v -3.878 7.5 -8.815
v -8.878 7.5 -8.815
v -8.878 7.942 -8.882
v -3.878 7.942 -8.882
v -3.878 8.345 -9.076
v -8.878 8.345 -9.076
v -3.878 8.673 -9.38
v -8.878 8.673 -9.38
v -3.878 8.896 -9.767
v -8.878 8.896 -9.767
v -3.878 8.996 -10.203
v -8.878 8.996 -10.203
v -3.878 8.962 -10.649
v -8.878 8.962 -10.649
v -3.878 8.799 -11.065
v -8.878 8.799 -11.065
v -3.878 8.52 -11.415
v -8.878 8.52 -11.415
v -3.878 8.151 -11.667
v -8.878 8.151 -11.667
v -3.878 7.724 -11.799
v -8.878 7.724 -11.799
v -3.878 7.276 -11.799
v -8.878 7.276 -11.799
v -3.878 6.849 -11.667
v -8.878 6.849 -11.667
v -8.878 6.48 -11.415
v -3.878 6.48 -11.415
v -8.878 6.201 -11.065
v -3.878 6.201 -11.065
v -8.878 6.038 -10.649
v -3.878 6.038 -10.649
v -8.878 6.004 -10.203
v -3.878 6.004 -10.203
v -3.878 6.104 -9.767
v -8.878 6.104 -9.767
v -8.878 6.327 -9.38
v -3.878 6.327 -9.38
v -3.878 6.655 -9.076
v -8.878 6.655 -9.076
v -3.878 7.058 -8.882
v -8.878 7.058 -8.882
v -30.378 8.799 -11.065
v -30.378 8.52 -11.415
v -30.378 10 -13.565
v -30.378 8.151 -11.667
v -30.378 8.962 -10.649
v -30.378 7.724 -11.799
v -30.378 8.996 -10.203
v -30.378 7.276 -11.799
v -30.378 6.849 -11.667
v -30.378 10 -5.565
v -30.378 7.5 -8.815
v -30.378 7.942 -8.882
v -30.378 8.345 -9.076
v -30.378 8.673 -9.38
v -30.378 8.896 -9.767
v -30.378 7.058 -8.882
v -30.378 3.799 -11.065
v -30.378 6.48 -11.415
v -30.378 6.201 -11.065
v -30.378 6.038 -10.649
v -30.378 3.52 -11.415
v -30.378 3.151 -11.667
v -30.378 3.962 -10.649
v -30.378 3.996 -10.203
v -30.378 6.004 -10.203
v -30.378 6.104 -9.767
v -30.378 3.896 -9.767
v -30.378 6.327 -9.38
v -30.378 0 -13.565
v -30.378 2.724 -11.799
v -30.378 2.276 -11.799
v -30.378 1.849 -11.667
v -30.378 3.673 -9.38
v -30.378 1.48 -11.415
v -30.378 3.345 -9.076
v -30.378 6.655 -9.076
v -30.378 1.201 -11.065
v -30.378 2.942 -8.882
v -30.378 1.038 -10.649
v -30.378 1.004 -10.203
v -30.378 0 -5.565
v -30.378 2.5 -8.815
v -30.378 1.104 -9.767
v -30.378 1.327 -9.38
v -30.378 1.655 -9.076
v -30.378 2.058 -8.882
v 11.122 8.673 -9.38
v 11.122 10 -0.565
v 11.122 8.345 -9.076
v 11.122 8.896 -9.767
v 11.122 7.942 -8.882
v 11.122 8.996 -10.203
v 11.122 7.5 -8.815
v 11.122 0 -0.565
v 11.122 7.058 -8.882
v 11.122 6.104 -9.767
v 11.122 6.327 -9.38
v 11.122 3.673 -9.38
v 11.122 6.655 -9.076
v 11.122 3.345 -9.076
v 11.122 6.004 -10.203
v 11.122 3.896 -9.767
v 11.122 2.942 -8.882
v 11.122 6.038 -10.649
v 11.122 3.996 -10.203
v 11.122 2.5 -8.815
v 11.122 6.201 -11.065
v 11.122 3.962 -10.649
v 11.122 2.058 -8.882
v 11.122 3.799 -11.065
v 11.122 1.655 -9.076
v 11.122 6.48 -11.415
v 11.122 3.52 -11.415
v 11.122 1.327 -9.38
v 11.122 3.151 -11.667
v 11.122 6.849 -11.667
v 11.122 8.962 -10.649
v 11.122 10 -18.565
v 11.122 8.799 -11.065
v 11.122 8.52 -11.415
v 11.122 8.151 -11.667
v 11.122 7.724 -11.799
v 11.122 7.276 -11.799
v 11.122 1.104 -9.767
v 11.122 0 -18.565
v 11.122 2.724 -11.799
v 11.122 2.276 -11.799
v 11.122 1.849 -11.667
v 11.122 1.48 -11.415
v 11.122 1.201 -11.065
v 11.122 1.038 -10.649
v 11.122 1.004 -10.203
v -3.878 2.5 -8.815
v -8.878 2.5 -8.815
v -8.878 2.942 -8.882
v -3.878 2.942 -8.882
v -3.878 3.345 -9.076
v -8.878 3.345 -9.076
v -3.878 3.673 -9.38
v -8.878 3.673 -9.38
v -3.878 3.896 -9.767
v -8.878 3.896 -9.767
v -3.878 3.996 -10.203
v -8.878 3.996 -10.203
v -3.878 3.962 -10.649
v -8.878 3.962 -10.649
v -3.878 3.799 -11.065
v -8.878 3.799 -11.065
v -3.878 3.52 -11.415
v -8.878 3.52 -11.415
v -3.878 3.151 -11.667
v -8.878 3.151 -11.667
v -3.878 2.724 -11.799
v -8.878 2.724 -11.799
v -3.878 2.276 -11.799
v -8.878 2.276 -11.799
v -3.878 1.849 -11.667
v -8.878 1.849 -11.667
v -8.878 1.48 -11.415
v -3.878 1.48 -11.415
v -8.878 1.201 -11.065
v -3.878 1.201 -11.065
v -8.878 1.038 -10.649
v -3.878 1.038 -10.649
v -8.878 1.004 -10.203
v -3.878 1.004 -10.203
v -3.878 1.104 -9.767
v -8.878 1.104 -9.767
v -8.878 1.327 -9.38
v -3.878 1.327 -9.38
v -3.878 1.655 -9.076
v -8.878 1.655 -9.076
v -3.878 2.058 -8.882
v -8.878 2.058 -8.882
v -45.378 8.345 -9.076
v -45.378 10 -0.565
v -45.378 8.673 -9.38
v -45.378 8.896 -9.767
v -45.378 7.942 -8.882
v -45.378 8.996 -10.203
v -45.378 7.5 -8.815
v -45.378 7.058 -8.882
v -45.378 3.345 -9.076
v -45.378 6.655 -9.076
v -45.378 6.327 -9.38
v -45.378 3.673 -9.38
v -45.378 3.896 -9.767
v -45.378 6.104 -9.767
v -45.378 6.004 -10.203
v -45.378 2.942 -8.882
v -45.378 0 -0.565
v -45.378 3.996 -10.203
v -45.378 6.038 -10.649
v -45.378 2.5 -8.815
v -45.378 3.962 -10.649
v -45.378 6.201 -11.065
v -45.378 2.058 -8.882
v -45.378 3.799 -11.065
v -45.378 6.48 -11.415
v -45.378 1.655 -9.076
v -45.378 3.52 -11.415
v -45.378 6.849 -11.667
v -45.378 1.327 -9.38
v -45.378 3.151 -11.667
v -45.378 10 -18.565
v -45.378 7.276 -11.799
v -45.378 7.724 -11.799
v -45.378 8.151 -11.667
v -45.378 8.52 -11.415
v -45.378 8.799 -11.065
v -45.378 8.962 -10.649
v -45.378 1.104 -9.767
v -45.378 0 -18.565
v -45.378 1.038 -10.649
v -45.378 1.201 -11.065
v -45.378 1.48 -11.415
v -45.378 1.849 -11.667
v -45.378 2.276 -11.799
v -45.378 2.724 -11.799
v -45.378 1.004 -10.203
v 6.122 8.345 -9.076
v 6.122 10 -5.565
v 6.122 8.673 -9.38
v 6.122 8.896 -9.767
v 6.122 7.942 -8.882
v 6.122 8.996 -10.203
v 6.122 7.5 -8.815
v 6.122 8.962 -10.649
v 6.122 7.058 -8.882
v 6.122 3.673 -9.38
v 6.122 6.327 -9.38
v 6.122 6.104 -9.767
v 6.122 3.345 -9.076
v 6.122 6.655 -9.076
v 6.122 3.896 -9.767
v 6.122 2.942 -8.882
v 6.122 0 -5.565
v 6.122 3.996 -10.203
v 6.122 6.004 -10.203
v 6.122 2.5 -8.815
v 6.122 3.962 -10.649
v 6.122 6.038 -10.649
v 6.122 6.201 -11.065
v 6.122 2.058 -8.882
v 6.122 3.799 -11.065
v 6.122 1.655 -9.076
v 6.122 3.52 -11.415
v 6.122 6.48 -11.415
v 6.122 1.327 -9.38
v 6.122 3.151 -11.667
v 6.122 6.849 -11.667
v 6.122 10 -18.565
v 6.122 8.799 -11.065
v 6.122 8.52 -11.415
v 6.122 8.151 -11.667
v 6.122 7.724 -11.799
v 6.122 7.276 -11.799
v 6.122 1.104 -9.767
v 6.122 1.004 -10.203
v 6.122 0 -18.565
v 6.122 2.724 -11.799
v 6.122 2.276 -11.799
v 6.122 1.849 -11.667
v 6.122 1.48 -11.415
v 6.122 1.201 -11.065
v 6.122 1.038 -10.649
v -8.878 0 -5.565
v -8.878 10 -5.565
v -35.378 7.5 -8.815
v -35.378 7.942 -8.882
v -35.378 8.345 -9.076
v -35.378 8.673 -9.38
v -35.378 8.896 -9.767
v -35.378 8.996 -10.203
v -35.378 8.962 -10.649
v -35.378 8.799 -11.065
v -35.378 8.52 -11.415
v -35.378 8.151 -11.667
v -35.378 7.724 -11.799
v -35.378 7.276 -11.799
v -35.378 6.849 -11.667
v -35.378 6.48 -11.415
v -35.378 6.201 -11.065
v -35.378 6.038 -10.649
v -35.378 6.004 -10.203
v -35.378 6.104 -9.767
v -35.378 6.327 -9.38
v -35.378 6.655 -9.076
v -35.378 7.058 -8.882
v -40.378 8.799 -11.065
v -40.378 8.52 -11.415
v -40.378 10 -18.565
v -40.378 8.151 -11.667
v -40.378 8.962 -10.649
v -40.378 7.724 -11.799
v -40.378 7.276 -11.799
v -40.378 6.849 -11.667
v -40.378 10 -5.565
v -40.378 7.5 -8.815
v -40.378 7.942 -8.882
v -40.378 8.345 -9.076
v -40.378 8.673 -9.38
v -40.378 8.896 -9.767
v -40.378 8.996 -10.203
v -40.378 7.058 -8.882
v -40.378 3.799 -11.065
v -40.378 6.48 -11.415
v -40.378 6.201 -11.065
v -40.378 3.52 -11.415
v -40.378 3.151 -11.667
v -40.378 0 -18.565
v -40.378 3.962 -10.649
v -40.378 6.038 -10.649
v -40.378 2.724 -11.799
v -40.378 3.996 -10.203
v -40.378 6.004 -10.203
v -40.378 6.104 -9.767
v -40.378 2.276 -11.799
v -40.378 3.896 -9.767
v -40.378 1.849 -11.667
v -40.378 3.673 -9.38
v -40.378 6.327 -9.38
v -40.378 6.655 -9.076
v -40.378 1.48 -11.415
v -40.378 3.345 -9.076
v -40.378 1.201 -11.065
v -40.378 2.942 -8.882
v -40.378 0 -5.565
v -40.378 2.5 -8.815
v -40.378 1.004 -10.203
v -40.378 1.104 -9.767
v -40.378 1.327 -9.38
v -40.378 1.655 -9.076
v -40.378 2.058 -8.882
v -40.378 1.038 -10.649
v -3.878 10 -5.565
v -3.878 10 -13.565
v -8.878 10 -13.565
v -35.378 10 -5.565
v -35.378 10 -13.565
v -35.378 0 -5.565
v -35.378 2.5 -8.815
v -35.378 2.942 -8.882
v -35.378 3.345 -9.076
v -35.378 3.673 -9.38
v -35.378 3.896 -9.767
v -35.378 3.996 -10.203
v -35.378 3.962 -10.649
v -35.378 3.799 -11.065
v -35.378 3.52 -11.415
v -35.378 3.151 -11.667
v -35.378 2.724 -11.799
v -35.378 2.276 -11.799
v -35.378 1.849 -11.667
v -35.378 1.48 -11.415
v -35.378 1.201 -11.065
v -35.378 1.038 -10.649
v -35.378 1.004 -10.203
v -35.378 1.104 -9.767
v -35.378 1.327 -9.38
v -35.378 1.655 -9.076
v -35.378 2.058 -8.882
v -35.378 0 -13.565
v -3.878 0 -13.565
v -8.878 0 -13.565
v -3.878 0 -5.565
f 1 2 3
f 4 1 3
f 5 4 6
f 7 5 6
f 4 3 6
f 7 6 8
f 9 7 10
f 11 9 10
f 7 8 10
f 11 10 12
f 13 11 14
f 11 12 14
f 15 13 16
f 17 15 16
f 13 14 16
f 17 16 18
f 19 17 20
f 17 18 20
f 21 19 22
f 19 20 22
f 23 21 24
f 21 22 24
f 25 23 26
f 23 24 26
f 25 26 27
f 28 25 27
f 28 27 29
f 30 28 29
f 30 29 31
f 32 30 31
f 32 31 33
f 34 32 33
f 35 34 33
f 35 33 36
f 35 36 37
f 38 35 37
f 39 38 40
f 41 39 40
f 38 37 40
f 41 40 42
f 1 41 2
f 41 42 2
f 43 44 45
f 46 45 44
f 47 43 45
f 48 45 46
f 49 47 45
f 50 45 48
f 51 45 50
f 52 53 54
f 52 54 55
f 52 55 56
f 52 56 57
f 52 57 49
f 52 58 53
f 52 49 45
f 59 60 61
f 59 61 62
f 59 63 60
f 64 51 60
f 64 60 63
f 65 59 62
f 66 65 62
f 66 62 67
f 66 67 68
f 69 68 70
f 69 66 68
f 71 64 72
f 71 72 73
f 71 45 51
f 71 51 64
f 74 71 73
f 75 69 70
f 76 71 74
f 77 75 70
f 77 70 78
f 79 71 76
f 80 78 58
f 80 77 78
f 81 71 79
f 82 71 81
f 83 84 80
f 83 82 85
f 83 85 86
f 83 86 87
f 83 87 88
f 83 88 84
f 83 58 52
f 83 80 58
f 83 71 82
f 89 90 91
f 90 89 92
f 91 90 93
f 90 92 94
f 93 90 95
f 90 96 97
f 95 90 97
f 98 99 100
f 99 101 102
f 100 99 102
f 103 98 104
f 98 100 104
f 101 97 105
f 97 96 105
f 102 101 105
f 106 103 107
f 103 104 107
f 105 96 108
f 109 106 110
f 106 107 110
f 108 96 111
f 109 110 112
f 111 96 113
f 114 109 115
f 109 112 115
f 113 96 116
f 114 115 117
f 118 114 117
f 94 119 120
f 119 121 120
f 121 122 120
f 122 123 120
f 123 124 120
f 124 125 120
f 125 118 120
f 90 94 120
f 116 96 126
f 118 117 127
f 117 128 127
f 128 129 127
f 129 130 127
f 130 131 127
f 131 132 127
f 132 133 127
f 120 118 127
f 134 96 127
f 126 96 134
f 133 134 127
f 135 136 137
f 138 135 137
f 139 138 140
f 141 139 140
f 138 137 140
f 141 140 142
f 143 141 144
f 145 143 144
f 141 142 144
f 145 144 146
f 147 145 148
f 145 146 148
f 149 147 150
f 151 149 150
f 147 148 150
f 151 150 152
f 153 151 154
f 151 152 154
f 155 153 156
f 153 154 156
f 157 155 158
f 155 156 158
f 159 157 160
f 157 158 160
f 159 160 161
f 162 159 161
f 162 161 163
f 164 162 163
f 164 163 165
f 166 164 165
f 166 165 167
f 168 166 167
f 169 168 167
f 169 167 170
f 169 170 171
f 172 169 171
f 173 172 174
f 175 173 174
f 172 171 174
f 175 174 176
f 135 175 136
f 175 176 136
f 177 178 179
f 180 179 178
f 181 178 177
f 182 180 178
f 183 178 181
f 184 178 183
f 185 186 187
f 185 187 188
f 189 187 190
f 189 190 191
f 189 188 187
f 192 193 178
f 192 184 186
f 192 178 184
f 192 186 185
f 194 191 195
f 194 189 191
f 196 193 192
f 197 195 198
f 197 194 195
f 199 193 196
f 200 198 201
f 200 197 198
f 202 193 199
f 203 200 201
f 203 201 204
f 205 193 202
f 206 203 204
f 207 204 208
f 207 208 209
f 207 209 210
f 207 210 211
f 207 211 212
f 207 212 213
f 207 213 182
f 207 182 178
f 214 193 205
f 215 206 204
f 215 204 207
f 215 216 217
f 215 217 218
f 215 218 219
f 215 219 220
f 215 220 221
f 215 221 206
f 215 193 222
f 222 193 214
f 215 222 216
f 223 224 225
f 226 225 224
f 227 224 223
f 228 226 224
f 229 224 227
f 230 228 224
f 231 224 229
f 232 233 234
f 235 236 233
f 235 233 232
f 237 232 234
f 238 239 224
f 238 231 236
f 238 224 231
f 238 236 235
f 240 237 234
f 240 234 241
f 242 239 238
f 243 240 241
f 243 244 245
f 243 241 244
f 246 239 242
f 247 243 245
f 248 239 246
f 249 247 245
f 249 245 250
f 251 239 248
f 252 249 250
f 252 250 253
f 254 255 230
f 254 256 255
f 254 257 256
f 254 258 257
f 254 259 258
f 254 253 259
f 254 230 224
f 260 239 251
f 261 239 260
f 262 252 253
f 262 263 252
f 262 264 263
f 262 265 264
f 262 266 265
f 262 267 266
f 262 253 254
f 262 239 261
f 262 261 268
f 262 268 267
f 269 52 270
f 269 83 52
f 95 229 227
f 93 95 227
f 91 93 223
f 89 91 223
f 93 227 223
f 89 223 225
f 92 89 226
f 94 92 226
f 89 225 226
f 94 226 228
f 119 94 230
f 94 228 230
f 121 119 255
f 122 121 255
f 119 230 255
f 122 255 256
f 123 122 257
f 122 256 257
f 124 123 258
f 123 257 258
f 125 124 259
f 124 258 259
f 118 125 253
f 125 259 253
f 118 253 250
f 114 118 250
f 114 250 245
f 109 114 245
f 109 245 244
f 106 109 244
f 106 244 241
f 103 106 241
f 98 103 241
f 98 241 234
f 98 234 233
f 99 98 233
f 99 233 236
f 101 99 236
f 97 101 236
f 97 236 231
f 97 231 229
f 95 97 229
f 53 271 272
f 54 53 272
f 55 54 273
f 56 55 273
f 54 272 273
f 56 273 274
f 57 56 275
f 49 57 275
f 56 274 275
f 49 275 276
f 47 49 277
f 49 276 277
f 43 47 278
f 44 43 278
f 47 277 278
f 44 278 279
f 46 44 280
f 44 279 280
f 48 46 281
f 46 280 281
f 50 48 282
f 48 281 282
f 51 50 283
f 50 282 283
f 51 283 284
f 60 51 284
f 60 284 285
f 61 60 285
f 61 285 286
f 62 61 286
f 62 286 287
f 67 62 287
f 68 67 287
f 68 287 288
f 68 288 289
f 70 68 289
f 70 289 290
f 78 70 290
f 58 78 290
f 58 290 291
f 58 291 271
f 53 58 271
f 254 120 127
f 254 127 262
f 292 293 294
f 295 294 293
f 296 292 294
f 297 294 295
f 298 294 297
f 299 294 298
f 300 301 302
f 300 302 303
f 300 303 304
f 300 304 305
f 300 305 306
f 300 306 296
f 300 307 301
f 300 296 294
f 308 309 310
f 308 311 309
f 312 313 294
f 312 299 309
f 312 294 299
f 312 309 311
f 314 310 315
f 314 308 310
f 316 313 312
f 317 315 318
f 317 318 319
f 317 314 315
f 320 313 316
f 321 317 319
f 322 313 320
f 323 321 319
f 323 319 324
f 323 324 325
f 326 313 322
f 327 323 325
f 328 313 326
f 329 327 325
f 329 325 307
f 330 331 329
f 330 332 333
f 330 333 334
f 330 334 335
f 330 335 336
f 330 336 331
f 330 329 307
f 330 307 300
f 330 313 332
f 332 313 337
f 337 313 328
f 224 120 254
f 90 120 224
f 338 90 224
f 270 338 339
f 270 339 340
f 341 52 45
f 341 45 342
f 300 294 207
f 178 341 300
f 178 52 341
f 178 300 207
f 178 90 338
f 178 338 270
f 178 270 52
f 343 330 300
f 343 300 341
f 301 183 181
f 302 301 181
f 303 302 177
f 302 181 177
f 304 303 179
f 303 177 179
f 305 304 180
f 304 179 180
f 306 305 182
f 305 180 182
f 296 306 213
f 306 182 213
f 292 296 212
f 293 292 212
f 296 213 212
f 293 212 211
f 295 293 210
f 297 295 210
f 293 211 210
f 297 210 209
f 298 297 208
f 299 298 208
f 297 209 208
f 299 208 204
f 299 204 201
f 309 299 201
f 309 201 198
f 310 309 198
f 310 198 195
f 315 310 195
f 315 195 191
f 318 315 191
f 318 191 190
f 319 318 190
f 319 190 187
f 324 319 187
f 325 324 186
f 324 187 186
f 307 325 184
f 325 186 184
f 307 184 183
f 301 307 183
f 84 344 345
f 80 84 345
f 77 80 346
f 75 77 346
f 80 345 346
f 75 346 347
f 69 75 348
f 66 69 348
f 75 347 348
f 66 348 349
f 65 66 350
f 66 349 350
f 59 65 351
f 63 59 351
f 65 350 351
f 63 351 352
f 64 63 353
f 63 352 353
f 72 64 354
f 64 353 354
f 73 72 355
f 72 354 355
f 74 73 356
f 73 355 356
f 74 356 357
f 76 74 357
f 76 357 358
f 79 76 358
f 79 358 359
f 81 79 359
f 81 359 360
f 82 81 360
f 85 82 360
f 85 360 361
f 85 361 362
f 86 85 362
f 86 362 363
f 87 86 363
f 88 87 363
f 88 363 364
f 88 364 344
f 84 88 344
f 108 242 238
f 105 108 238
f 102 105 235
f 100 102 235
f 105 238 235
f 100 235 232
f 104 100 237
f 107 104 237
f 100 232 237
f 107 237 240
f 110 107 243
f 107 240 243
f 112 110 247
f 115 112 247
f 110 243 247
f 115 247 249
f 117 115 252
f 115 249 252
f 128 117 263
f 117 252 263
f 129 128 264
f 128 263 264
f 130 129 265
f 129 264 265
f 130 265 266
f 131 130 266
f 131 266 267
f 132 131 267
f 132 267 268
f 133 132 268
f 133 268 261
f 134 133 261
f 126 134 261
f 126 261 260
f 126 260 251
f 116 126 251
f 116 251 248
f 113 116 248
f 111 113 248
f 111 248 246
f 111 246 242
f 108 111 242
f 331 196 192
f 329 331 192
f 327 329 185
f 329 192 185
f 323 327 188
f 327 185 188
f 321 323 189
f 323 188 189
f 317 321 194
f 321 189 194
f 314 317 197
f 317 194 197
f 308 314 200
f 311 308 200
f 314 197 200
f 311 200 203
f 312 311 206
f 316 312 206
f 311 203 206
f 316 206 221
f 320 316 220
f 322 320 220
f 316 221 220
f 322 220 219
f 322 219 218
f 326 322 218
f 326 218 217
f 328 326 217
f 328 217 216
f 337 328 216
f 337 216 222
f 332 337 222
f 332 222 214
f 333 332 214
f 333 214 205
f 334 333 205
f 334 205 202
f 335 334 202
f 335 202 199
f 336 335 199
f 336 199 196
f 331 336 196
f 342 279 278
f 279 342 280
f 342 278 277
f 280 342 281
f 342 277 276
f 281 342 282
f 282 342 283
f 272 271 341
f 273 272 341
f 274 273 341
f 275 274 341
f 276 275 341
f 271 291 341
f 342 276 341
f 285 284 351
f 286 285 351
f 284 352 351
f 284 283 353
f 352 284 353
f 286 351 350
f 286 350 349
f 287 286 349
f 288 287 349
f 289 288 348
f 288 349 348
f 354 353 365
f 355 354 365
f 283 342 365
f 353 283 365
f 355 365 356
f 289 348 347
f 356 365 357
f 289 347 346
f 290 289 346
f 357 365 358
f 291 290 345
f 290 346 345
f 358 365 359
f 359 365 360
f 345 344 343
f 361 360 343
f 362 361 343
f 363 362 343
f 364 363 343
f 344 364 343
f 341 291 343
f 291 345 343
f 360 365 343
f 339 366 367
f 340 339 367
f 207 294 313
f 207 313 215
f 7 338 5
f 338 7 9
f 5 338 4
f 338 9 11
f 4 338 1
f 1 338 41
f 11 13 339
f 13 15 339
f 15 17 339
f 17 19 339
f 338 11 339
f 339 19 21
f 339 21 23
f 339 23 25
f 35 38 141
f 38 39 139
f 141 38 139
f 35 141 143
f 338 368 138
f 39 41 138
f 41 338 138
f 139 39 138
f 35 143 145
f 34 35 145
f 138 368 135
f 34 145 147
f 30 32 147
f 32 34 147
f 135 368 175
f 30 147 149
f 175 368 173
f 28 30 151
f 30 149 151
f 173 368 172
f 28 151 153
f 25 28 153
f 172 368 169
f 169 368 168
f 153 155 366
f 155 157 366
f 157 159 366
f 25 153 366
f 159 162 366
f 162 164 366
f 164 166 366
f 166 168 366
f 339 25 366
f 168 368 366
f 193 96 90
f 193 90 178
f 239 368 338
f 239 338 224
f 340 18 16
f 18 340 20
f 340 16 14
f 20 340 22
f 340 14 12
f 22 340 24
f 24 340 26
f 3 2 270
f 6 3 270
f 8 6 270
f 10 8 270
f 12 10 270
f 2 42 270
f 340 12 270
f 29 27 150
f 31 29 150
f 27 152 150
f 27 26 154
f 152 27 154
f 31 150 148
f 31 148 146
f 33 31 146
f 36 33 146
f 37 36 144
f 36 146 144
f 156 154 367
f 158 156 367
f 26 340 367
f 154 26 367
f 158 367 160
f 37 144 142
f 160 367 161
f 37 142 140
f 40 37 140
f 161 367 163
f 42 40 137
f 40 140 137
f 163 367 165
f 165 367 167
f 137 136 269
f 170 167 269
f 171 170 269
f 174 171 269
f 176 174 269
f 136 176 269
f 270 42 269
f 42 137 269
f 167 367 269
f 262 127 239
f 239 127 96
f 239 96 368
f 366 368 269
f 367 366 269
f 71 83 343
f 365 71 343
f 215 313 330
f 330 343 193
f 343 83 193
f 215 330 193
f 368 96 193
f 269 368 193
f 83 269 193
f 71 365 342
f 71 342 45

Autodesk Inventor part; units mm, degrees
ref_plane "YZ Plane" through (0, 0, 0) normal (1, 0, 0) x (0, 1, 0)
ref_plane "XZ Plane" through (0, 0, 0) normal (0, 1, 0) x (-1, 0, 0)
ref_plane "XY Plane" through (0, 0, 0) normal (0, 0, 1) x (1, 0, 0)
sketch "Sketch1" plane through (0, 0, 0) normal (0, 1, 0) x (-1, 0, 0)
  line L0 (-6.122, -0.5654) -> (40.378, -0.5654)
  line L1 (40.378, -0.5654) -> (40.378, -5.5654)
  line L2 (40.378, -5.5654) -> (-6.122, -5.5654)
  line L3 (-6.122, -5.5654) -> (-6.122, -0.5654)
  line L4 (40.378, -0.5654) -> (45.378, -0.5654)
  line L5 (45.378, -0.5654) -> (45.378, -5.5654)
  line L6 (45.378, -5.5654) -> (40.378, -5.5654)
  line L7 (45.378, -5.5654) -> (45.378, -13.5654)
  line L8 (45.378, -13.5654) -> (40.378, -13.5654)
  line L9 (40.378, -13.5654) -> (40.378, -5.5654)
  line L10 (35.378, -13.5654) -> (35.378, -5.5654)
  line L11 (35.378, -13.5654) -> (30.378, -13.5654)
  line L12 (30.378, -13.5654) -> (30.378, -5.5654)
  line L13 (-6.122, -0.5654) -> (-11.122, -0.5654)
  line L14 (-11.122, -0.5654) -> (-11.122, -5.5654)
  line L15 (-11.122, -5.5654) -> (-6.122, -5.5654)
  line L16 (-11.122, -5.5654) -> (-11.122, -13.5654)
  line L17 (-11.122, -13.5654) -> (-6.122, -13.5654)
  line L18 (-6.122, -5.5654) -> (3.878, -5.5654)
  line L19 (3.878, -5.5654) -> (3.878, -13.5654)
  line L20 (3.878, -13.5654) -> (8.878, -13.5654)
  line L21 (8.878, -13.5654) -> (8.878, -5.5654)
  line L22 (-6.122, -5.5654) -> (-6.122, -13.5654)
  point P0 (0, 0)
  dimension "d0" = 46.5
  dimension "d1" = 5
  dimension "d2" = 5
  dimension "d3" = 8
  dimension "d4" = 5
  dimension "d5" = 5
  dimension "d6" = 5
  dimension "d7" = 8
  dimension "d8" = 10
  dimension "d9" = 5
extrude "Extrusion1" add sketch "Sketch1" along normal blind 10
sketch "Sketch2" plane through (-45.378, 0, -13.5654) normal (-1, 0, 0) x (0, 0, 1)
  line L0 (0, 10) -> (13, 10) projected
  line L1 (13, 10) -> (0, 10)
  line L2 (0, 10) -> (6.5, 10)
  line L3 (0, 0) -> (8, 0) projected
  line L4 (6.5, 0) -> (6.5, 10)
  line L5 (6.5, 5) -> (0, 5)
  line L6 (0, 5) -> (3.25, 5)
  line L7 (3.25, 0) -> (3.25, 5)
  line L8 (3.25, 10) -> (3.25, 5)
  circle A0 centre (3.25, 7.5) radius 1.5
  circle A1 centre (3.25, 2.5) radius 1.5
  point P0 (13.5654, 0)
  dimension "d12" = 3
  dimension "d13" = 3
extrude "Extrusion2" cut sketch "Sketch2" against normal blind 60 contours A0 L8 | L8 A0 | A1 L7 | L7 A1
thread "Thread1" size "M3x0.5" class "6H" standard "ANSI Metric M Profile" full length
thread "Thread2" size "M3x0.5" class "6H" standard "ANSI Metric M Profile" full length
thread "Thread3" size "M3x0.5" class "6H" standard "ANSI Metric M Profile" full length
thread "Thread4" size "M3x0.5" class "6H" standard "ANSI Metric M Profile" full length
thread "Thread5" size "M3x0.5" class "6H" standard "ANSI Metric M Profile" full length
thread "Thread6" size "M3x0.5" class "6H" standard "ANSI Metric M Profile" full length
thread "Thread7" size "M3x0.5" class "6H" standard "ANSI Metric M Profile" full length
thread "Thread8" size "M3x0.5" class "6H" standard "ANSI Metric M Profile" full length
sketch "Sketch3" plane through (-40.378, 0, -13.5654) normal (0, 0, -1) x (-1, 0, 0)
  line L0 (5, 10) -> (-51.5, 10) projected
  line L1 (5, 0) -> (5, 10) projected
  line L2 (0.1606, 10) -> (5, 10)
  line L3 (5, 10) -> (5, 0)
  line L4 (5, 0) -> (0.1606, 0)
  line L5 (0.1606, 0) -> (0.1606, 10)
  line L6 (-10, 0) -> (-10, 10) projected
  line L7 (-5, 0) -> (-5, 10) projected
  line L8 (-10, 10) -> (-5, 10)
  line L9 (-5, 10) -> (-5, 0)
  line L10 (-5, 0) -> (-10, 0)
  line L11 (-10, 0) -> (-10, 10)
  line L12 (-36.5, 0) -> (-36.5, 10) projected
  line L13 (-31.5, 0) -> (-31.5, 10) projected
  line L14 (-36.5, 10) -> (-31.5, 10)
  line L15 (-31.5, 10) -> (-31.5, 0)
  line L16 (-31.5, 0) -> (-36.5, 0)
  line L17 (-36.5, 0) -> (-36.5, 10)
  line L18 (-46.5, 0) -> (-46.5, 10) projected
  line L19 (-51.5, 0) -> (-51.5, 10) projected
  line L20 (-46.5, 0) -> (-51.5, 0)
  line L21 (-51.5, 0) -> (-51.5, 10)
  line L22 (-51.5, 10) -> (-46.5, 10)
  line L23 (-46.5, 10) -> (-46.5, 0)
  line L24 (0, 10) -> (5, 10)
  line L25 (5, 10) -> (5, 0)
  line L26 (5, 0) -> (0, 0)
  line L27 (0, 0) -> (0, 10)
  point P0 (-40.378, 0)
extrude "Extrusion3" add sketch "Sketch3" along normal blind 5 contours L1 L4 L5 L0 | L18 L20 L19 L0 | L5 L26 L27 L0
sketch "Sketch4" plane through (0, 10, 0) normal (0, 1, 0) x (1, 0, 0)
  point P0 (0, 0)
properties part number "soporte"
